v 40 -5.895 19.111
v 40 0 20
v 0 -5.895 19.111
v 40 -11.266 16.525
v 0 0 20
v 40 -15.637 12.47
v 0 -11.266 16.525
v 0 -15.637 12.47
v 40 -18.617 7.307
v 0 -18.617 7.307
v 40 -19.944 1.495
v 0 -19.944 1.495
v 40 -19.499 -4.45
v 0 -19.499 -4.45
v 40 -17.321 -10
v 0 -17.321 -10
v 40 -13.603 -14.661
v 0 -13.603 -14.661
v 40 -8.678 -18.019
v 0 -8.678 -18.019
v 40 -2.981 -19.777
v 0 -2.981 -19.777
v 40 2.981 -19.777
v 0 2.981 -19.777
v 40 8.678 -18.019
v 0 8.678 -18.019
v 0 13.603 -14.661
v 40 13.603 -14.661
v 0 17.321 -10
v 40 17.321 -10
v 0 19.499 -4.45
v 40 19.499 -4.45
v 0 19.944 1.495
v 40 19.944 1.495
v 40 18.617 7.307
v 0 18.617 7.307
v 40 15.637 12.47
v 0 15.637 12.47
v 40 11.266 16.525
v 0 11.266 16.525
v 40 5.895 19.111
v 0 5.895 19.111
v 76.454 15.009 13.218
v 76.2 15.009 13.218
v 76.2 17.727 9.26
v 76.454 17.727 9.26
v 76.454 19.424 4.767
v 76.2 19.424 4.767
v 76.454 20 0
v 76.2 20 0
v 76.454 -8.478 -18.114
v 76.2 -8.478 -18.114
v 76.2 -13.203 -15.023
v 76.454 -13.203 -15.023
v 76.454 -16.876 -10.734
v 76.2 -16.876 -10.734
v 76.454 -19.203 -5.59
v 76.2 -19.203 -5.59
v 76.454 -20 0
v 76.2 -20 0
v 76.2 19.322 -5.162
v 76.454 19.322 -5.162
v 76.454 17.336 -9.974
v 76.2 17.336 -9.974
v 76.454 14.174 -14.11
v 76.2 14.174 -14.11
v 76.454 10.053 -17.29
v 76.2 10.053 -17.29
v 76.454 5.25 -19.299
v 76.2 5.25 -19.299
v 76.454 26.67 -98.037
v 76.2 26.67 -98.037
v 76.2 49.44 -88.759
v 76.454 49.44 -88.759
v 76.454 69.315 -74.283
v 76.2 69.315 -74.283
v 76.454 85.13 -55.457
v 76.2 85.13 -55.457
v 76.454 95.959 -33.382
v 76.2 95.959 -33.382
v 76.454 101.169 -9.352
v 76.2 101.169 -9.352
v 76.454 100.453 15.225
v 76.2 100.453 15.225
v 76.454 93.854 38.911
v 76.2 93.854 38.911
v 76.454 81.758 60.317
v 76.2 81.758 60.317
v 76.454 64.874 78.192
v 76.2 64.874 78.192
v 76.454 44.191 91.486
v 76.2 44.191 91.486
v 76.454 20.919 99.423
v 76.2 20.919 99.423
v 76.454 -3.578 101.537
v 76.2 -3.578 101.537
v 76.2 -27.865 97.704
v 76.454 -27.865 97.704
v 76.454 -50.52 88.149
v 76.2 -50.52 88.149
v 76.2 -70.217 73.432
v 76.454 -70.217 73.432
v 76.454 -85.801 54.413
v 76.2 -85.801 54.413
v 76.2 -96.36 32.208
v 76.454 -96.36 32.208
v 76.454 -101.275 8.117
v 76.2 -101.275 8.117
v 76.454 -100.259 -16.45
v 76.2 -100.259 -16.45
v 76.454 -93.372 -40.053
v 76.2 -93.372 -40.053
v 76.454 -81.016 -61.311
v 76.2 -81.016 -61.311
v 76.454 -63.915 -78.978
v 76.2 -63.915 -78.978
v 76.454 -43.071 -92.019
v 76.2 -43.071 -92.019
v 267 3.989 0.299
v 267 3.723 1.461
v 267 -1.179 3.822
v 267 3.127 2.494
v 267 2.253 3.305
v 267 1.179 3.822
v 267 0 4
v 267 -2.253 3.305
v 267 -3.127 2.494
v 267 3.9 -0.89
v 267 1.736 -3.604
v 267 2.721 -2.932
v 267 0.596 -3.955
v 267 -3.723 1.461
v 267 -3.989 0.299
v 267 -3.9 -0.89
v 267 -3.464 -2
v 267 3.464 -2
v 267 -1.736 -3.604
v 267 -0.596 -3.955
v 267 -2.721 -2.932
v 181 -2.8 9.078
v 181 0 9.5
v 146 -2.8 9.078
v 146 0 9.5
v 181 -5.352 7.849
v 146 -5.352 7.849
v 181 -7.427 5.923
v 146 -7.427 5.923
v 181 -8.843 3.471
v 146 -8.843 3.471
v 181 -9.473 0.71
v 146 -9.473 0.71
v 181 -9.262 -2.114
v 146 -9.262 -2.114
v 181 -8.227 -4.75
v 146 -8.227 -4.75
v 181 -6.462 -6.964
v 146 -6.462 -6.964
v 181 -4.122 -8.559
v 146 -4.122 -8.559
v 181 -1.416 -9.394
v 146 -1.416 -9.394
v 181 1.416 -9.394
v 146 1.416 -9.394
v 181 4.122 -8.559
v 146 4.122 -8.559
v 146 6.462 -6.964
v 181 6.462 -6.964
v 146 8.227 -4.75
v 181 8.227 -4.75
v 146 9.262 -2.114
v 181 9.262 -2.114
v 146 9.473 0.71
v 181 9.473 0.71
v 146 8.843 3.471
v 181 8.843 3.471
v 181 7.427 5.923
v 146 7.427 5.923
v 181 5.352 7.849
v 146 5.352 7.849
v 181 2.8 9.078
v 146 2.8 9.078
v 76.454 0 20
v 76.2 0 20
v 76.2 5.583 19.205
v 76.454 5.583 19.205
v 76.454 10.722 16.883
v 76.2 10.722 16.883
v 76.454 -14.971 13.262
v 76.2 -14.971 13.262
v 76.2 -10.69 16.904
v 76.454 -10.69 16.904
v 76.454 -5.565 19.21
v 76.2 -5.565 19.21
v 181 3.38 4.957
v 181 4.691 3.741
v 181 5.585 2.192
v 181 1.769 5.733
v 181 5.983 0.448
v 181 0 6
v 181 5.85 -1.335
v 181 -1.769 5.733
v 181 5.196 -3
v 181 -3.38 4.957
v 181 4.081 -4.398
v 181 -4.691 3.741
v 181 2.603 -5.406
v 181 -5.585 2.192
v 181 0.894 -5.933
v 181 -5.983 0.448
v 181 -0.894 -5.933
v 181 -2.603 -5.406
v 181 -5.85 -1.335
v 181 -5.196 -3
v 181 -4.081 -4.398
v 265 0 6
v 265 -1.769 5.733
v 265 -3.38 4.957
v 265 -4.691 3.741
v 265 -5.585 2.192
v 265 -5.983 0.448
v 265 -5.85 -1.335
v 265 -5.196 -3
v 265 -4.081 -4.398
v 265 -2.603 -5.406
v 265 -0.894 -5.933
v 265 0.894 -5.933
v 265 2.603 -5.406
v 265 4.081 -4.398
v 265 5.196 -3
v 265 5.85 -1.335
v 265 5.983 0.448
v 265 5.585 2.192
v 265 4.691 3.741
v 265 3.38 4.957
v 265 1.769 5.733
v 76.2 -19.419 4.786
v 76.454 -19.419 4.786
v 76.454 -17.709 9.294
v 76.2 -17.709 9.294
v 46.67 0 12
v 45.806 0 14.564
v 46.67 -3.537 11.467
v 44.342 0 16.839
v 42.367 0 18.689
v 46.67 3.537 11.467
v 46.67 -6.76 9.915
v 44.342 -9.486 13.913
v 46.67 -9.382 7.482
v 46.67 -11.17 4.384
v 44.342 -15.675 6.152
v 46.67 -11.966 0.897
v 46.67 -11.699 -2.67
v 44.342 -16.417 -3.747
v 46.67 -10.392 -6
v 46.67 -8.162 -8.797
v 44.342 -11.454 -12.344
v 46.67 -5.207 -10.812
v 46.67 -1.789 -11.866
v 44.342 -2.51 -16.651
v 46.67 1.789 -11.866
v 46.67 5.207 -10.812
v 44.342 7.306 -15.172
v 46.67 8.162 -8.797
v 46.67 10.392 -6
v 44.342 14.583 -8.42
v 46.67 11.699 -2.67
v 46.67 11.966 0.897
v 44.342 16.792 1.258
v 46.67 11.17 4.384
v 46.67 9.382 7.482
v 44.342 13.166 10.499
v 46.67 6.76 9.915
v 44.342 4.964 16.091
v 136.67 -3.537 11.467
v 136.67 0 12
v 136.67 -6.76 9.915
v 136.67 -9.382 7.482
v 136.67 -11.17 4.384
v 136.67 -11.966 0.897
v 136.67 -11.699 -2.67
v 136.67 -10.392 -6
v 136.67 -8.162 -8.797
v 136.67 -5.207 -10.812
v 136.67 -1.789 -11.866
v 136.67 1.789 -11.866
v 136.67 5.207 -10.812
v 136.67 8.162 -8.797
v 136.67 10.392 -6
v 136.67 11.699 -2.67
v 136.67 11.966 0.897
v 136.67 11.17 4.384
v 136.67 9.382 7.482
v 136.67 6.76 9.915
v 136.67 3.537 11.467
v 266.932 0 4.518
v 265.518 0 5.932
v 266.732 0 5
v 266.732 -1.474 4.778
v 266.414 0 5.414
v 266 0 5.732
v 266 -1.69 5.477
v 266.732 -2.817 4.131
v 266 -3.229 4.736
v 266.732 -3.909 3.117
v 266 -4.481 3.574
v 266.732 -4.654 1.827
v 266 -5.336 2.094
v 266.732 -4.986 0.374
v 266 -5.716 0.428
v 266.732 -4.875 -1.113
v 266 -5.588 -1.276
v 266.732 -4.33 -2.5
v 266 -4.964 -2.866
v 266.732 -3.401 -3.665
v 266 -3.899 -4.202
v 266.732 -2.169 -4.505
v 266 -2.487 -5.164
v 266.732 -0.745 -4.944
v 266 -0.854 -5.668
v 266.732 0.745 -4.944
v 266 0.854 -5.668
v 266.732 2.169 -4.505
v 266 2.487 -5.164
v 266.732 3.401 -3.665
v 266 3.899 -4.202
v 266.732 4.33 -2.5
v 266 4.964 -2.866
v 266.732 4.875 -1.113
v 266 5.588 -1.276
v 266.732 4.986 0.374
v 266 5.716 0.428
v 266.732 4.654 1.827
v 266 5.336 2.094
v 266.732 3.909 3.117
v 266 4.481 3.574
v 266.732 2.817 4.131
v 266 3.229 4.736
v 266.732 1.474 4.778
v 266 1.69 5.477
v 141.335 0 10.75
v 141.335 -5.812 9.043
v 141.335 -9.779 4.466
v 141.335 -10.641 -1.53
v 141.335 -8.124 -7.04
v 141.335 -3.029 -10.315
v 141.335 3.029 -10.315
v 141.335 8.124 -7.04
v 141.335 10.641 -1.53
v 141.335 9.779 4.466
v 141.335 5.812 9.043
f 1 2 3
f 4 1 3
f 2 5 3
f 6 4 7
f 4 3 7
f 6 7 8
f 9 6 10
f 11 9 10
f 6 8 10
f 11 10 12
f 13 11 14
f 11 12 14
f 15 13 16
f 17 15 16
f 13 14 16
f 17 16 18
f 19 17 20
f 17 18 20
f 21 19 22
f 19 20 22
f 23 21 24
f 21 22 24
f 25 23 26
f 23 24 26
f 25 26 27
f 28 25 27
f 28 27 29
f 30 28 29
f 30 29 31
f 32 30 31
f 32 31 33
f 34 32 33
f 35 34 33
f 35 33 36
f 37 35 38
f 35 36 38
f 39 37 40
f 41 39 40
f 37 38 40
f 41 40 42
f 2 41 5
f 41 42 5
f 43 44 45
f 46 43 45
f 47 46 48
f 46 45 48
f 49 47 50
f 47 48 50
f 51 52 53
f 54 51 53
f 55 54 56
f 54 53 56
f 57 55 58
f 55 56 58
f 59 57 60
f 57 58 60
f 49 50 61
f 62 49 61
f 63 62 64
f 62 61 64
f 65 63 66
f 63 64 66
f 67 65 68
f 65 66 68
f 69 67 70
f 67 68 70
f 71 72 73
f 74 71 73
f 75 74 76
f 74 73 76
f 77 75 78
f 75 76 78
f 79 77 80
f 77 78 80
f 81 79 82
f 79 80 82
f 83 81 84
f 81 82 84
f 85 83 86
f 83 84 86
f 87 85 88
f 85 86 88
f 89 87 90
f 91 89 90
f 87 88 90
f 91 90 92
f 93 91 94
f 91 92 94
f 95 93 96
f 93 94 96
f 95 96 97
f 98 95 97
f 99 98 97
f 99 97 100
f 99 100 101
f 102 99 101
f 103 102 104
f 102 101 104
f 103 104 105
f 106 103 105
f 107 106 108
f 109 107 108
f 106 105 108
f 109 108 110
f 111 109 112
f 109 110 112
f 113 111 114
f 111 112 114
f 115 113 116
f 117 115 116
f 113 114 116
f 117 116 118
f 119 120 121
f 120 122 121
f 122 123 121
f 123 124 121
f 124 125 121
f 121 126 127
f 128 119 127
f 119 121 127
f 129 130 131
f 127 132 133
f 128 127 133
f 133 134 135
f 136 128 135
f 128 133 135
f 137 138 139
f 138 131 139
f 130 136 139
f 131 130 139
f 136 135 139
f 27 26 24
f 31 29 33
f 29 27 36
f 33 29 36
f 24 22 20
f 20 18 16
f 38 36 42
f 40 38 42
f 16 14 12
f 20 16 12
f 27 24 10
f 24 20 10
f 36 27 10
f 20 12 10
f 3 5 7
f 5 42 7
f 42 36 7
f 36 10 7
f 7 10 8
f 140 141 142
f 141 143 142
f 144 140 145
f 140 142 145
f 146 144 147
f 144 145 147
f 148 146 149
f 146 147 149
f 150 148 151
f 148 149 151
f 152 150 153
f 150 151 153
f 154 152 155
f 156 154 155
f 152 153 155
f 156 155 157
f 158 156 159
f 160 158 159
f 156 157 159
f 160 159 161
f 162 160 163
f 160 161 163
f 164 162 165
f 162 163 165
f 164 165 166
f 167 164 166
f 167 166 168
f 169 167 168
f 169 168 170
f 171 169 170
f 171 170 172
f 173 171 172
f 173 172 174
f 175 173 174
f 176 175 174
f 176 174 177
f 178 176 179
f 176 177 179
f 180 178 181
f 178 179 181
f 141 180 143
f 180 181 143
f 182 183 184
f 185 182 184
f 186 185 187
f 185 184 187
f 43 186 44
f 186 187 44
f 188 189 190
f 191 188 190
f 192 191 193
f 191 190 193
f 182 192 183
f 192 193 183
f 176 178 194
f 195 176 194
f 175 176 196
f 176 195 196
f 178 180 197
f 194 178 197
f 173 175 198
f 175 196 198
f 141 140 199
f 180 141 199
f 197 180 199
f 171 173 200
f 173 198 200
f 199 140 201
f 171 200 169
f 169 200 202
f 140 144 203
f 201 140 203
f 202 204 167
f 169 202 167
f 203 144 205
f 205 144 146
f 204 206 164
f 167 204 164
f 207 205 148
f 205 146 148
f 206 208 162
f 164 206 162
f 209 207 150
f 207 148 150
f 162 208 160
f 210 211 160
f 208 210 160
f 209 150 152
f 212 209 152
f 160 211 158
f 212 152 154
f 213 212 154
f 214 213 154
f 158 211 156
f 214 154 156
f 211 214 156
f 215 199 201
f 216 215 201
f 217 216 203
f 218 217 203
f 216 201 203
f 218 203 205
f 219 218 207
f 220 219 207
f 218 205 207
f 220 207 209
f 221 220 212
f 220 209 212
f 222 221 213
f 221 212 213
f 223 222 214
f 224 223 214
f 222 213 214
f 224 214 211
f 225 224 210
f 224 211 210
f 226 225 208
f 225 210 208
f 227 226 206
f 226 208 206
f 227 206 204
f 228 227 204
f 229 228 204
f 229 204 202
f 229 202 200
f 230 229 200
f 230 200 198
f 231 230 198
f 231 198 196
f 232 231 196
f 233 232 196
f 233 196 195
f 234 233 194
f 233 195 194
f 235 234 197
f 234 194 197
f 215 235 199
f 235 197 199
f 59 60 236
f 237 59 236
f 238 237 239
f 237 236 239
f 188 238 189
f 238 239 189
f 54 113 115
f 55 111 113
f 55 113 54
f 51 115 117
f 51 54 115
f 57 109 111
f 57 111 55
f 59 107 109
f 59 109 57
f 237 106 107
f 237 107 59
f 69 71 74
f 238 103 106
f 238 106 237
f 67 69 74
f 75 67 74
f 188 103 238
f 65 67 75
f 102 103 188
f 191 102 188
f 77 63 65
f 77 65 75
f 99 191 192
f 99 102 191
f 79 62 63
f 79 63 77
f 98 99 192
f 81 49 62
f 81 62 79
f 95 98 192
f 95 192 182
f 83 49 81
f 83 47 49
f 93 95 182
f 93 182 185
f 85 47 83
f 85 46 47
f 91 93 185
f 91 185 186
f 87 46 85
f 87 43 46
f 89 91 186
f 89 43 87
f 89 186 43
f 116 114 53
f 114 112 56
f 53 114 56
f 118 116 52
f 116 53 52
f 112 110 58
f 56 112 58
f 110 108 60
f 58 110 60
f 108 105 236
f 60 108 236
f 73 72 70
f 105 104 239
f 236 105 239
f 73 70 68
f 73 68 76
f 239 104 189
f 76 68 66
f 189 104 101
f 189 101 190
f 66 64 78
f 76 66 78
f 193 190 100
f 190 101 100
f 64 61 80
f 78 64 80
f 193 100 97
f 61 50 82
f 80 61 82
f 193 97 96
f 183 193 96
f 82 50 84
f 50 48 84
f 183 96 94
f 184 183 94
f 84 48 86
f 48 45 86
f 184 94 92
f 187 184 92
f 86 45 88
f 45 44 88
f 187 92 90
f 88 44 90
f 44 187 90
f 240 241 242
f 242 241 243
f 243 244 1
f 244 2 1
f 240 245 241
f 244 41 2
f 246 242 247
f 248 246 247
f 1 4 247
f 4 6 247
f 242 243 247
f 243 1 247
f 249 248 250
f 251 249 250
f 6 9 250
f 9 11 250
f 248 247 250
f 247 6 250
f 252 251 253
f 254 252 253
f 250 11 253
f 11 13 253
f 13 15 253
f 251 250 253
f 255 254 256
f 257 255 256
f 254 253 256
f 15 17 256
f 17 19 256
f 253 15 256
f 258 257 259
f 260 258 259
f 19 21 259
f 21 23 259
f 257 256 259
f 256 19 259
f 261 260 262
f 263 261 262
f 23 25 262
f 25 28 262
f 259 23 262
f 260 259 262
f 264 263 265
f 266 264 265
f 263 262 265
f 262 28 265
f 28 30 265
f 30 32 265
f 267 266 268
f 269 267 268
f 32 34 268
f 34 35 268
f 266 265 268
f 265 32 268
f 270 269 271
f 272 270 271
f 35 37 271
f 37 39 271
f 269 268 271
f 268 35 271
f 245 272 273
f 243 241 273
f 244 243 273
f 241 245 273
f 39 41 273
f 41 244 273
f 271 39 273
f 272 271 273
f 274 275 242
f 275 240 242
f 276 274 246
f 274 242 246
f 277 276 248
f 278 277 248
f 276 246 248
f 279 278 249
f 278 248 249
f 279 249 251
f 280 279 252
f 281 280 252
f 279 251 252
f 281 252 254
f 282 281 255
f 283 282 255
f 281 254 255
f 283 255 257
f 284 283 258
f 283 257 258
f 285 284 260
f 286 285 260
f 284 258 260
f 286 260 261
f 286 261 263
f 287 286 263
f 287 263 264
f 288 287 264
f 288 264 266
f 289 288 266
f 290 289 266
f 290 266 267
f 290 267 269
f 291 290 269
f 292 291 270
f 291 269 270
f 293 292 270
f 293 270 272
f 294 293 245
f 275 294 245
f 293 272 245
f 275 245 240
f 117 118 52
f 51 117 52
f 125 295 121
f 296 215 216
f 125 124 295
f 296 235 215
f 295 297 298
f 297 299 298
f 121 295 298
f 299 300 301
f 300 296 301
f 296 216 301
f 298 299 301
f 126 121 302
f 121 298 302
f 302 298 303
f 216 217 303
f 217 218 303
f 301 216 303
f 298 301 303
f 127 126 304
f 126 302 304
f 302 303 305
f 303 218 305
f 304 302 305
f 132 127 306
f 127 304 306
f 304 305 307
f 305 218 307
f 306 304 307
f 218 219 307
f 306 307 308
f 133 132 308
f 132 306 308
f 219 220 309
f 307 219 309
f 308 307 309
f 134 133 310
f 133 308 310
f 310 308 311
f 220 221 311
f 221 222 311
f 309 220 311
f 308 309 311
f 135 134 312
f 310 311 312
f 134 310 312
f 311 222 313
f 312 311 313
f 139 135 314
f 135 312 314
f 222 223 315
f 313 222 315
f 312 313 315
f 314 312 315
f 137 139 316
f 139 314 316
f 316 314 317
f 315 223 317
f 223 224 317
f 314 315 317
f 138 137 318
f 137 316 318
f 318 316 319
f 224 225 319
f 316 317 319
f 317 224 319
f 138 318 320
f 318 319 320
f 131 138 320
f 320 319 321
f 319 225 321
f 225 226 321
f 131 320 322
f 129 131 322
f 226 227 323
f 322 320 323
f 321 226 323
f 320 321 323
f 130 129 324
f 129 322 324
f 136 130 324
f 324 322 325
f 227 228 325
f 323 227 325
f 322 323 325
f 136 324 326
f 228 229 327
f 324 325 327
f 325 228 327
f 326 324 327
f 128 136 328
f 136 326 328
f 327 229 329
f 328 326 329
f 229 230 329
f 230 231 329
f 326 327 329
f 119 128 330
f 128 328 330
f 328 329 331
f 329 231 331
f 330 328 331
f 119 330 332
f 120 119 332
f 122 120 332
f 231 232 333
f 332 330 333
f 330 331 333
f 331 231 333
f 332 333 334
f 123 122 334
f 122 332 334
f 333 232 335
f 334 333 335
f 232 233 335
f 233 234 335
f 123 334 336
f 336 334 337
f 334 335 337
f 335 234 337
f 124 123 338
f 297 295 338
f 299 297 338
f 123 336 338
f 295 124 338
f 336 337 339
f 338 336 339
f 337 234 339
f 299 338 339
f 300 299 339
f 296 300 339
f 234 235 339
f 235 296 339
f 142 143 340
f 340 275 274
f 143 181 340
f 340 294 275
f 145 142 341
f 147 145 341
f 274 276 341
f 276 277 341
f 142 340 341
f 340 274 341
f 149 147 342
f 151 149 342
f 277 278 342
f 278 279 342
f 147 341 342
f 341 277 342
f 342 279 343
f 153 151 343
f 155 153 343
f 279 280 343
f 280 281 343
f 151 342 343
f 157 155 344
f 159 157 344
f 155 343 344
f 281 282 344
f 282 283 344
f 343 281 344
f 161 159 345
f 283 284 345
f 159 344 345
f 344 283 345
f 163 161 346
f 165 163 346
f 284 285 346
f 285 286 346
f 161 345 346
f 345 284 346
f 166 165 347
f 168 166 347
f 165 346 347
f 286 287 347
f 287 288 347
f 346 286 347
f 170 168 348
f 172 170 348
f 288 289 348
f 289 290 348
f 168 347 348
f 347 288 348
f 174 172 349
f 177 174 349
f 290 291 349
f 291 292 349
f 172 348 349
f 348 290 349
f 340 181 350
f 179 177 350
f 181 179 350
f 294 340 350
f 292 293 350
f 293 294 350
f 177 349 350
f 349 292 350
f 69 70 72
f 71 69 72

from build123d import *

# Parameters (mm, degrees)
F2_R     = 2
F5_DEPTH = 0.254


with BuildPart() as f1:
    # F0 (on Front) → F1 (revolve)
    with BuildSketch(Plane.XZ):
        with BuildLine():
            Line((0, 0), (267, 0))
            Line((267, 0), (267, 6))
            Line((267, 6), (181, 6))
            Line((181, 6), (181, 9.5))
            Line((181, 9.5), (146, 9.5))
            Line((146, 9.5), (136.669873, 12))
            Line((136.669873, 12), (46.669873, 12))
            ThreePointArc((46.669873, 12), (44.341818, 16.839471), (40, 20))
            Line((40, 20), (0, 20))
            Line((0, 20), (0, 0))
        make_face()
    revolve(axis=Axis((133.5, 0, 0), (1, 0, 0)))

    # F2
    f2_edges = [f1.edges().sort_by_distance(p)[0] for p in [
        (267, 0, -6),
    ]]
    fillet(f2_edges, radius=F2_R)


with BuildPart() as f5:
    # F4 (on offset) → F5 (new body)
    with BuildSketch(Plane.YZ.offset(76.2)):
        with BuildLine():
            ThreePointArc((20, 0), (15.890263, -12.144939), (5.250046, -19.298627))
            Line((5.250046, -19.298627), (26.670233, -98.037027))
            ThreePointArc((26.670233, -98.037027), (8.734833, 101.223825), (-43.070592, -92.018934))
            Line((-43.070592, -92.018934), (-8.478463, -18.113963))
            ThreePointArc((-8.478463, -18.113963), (-16.875563, -10.733842), (-20, 0))
            ThreePointArc((-20, 0), (-18.700472, 7.091711), (-14.970764, 13.261833))
            ThreePointArc((-14.970764, 13.261833), (-8.208634, 18.237827), (0, 20))
            ThreePointArc((0, 20), (8.235029, 18.225924), (15.009101, 13.21843))
            ThreePointArc((15.009101, 13.21843), (18.710719, 7.06463), (20, 0))
        make_face()
    extrude(amount=F5_DEPTH)


solid = Compound([f1.part, f5.part])
